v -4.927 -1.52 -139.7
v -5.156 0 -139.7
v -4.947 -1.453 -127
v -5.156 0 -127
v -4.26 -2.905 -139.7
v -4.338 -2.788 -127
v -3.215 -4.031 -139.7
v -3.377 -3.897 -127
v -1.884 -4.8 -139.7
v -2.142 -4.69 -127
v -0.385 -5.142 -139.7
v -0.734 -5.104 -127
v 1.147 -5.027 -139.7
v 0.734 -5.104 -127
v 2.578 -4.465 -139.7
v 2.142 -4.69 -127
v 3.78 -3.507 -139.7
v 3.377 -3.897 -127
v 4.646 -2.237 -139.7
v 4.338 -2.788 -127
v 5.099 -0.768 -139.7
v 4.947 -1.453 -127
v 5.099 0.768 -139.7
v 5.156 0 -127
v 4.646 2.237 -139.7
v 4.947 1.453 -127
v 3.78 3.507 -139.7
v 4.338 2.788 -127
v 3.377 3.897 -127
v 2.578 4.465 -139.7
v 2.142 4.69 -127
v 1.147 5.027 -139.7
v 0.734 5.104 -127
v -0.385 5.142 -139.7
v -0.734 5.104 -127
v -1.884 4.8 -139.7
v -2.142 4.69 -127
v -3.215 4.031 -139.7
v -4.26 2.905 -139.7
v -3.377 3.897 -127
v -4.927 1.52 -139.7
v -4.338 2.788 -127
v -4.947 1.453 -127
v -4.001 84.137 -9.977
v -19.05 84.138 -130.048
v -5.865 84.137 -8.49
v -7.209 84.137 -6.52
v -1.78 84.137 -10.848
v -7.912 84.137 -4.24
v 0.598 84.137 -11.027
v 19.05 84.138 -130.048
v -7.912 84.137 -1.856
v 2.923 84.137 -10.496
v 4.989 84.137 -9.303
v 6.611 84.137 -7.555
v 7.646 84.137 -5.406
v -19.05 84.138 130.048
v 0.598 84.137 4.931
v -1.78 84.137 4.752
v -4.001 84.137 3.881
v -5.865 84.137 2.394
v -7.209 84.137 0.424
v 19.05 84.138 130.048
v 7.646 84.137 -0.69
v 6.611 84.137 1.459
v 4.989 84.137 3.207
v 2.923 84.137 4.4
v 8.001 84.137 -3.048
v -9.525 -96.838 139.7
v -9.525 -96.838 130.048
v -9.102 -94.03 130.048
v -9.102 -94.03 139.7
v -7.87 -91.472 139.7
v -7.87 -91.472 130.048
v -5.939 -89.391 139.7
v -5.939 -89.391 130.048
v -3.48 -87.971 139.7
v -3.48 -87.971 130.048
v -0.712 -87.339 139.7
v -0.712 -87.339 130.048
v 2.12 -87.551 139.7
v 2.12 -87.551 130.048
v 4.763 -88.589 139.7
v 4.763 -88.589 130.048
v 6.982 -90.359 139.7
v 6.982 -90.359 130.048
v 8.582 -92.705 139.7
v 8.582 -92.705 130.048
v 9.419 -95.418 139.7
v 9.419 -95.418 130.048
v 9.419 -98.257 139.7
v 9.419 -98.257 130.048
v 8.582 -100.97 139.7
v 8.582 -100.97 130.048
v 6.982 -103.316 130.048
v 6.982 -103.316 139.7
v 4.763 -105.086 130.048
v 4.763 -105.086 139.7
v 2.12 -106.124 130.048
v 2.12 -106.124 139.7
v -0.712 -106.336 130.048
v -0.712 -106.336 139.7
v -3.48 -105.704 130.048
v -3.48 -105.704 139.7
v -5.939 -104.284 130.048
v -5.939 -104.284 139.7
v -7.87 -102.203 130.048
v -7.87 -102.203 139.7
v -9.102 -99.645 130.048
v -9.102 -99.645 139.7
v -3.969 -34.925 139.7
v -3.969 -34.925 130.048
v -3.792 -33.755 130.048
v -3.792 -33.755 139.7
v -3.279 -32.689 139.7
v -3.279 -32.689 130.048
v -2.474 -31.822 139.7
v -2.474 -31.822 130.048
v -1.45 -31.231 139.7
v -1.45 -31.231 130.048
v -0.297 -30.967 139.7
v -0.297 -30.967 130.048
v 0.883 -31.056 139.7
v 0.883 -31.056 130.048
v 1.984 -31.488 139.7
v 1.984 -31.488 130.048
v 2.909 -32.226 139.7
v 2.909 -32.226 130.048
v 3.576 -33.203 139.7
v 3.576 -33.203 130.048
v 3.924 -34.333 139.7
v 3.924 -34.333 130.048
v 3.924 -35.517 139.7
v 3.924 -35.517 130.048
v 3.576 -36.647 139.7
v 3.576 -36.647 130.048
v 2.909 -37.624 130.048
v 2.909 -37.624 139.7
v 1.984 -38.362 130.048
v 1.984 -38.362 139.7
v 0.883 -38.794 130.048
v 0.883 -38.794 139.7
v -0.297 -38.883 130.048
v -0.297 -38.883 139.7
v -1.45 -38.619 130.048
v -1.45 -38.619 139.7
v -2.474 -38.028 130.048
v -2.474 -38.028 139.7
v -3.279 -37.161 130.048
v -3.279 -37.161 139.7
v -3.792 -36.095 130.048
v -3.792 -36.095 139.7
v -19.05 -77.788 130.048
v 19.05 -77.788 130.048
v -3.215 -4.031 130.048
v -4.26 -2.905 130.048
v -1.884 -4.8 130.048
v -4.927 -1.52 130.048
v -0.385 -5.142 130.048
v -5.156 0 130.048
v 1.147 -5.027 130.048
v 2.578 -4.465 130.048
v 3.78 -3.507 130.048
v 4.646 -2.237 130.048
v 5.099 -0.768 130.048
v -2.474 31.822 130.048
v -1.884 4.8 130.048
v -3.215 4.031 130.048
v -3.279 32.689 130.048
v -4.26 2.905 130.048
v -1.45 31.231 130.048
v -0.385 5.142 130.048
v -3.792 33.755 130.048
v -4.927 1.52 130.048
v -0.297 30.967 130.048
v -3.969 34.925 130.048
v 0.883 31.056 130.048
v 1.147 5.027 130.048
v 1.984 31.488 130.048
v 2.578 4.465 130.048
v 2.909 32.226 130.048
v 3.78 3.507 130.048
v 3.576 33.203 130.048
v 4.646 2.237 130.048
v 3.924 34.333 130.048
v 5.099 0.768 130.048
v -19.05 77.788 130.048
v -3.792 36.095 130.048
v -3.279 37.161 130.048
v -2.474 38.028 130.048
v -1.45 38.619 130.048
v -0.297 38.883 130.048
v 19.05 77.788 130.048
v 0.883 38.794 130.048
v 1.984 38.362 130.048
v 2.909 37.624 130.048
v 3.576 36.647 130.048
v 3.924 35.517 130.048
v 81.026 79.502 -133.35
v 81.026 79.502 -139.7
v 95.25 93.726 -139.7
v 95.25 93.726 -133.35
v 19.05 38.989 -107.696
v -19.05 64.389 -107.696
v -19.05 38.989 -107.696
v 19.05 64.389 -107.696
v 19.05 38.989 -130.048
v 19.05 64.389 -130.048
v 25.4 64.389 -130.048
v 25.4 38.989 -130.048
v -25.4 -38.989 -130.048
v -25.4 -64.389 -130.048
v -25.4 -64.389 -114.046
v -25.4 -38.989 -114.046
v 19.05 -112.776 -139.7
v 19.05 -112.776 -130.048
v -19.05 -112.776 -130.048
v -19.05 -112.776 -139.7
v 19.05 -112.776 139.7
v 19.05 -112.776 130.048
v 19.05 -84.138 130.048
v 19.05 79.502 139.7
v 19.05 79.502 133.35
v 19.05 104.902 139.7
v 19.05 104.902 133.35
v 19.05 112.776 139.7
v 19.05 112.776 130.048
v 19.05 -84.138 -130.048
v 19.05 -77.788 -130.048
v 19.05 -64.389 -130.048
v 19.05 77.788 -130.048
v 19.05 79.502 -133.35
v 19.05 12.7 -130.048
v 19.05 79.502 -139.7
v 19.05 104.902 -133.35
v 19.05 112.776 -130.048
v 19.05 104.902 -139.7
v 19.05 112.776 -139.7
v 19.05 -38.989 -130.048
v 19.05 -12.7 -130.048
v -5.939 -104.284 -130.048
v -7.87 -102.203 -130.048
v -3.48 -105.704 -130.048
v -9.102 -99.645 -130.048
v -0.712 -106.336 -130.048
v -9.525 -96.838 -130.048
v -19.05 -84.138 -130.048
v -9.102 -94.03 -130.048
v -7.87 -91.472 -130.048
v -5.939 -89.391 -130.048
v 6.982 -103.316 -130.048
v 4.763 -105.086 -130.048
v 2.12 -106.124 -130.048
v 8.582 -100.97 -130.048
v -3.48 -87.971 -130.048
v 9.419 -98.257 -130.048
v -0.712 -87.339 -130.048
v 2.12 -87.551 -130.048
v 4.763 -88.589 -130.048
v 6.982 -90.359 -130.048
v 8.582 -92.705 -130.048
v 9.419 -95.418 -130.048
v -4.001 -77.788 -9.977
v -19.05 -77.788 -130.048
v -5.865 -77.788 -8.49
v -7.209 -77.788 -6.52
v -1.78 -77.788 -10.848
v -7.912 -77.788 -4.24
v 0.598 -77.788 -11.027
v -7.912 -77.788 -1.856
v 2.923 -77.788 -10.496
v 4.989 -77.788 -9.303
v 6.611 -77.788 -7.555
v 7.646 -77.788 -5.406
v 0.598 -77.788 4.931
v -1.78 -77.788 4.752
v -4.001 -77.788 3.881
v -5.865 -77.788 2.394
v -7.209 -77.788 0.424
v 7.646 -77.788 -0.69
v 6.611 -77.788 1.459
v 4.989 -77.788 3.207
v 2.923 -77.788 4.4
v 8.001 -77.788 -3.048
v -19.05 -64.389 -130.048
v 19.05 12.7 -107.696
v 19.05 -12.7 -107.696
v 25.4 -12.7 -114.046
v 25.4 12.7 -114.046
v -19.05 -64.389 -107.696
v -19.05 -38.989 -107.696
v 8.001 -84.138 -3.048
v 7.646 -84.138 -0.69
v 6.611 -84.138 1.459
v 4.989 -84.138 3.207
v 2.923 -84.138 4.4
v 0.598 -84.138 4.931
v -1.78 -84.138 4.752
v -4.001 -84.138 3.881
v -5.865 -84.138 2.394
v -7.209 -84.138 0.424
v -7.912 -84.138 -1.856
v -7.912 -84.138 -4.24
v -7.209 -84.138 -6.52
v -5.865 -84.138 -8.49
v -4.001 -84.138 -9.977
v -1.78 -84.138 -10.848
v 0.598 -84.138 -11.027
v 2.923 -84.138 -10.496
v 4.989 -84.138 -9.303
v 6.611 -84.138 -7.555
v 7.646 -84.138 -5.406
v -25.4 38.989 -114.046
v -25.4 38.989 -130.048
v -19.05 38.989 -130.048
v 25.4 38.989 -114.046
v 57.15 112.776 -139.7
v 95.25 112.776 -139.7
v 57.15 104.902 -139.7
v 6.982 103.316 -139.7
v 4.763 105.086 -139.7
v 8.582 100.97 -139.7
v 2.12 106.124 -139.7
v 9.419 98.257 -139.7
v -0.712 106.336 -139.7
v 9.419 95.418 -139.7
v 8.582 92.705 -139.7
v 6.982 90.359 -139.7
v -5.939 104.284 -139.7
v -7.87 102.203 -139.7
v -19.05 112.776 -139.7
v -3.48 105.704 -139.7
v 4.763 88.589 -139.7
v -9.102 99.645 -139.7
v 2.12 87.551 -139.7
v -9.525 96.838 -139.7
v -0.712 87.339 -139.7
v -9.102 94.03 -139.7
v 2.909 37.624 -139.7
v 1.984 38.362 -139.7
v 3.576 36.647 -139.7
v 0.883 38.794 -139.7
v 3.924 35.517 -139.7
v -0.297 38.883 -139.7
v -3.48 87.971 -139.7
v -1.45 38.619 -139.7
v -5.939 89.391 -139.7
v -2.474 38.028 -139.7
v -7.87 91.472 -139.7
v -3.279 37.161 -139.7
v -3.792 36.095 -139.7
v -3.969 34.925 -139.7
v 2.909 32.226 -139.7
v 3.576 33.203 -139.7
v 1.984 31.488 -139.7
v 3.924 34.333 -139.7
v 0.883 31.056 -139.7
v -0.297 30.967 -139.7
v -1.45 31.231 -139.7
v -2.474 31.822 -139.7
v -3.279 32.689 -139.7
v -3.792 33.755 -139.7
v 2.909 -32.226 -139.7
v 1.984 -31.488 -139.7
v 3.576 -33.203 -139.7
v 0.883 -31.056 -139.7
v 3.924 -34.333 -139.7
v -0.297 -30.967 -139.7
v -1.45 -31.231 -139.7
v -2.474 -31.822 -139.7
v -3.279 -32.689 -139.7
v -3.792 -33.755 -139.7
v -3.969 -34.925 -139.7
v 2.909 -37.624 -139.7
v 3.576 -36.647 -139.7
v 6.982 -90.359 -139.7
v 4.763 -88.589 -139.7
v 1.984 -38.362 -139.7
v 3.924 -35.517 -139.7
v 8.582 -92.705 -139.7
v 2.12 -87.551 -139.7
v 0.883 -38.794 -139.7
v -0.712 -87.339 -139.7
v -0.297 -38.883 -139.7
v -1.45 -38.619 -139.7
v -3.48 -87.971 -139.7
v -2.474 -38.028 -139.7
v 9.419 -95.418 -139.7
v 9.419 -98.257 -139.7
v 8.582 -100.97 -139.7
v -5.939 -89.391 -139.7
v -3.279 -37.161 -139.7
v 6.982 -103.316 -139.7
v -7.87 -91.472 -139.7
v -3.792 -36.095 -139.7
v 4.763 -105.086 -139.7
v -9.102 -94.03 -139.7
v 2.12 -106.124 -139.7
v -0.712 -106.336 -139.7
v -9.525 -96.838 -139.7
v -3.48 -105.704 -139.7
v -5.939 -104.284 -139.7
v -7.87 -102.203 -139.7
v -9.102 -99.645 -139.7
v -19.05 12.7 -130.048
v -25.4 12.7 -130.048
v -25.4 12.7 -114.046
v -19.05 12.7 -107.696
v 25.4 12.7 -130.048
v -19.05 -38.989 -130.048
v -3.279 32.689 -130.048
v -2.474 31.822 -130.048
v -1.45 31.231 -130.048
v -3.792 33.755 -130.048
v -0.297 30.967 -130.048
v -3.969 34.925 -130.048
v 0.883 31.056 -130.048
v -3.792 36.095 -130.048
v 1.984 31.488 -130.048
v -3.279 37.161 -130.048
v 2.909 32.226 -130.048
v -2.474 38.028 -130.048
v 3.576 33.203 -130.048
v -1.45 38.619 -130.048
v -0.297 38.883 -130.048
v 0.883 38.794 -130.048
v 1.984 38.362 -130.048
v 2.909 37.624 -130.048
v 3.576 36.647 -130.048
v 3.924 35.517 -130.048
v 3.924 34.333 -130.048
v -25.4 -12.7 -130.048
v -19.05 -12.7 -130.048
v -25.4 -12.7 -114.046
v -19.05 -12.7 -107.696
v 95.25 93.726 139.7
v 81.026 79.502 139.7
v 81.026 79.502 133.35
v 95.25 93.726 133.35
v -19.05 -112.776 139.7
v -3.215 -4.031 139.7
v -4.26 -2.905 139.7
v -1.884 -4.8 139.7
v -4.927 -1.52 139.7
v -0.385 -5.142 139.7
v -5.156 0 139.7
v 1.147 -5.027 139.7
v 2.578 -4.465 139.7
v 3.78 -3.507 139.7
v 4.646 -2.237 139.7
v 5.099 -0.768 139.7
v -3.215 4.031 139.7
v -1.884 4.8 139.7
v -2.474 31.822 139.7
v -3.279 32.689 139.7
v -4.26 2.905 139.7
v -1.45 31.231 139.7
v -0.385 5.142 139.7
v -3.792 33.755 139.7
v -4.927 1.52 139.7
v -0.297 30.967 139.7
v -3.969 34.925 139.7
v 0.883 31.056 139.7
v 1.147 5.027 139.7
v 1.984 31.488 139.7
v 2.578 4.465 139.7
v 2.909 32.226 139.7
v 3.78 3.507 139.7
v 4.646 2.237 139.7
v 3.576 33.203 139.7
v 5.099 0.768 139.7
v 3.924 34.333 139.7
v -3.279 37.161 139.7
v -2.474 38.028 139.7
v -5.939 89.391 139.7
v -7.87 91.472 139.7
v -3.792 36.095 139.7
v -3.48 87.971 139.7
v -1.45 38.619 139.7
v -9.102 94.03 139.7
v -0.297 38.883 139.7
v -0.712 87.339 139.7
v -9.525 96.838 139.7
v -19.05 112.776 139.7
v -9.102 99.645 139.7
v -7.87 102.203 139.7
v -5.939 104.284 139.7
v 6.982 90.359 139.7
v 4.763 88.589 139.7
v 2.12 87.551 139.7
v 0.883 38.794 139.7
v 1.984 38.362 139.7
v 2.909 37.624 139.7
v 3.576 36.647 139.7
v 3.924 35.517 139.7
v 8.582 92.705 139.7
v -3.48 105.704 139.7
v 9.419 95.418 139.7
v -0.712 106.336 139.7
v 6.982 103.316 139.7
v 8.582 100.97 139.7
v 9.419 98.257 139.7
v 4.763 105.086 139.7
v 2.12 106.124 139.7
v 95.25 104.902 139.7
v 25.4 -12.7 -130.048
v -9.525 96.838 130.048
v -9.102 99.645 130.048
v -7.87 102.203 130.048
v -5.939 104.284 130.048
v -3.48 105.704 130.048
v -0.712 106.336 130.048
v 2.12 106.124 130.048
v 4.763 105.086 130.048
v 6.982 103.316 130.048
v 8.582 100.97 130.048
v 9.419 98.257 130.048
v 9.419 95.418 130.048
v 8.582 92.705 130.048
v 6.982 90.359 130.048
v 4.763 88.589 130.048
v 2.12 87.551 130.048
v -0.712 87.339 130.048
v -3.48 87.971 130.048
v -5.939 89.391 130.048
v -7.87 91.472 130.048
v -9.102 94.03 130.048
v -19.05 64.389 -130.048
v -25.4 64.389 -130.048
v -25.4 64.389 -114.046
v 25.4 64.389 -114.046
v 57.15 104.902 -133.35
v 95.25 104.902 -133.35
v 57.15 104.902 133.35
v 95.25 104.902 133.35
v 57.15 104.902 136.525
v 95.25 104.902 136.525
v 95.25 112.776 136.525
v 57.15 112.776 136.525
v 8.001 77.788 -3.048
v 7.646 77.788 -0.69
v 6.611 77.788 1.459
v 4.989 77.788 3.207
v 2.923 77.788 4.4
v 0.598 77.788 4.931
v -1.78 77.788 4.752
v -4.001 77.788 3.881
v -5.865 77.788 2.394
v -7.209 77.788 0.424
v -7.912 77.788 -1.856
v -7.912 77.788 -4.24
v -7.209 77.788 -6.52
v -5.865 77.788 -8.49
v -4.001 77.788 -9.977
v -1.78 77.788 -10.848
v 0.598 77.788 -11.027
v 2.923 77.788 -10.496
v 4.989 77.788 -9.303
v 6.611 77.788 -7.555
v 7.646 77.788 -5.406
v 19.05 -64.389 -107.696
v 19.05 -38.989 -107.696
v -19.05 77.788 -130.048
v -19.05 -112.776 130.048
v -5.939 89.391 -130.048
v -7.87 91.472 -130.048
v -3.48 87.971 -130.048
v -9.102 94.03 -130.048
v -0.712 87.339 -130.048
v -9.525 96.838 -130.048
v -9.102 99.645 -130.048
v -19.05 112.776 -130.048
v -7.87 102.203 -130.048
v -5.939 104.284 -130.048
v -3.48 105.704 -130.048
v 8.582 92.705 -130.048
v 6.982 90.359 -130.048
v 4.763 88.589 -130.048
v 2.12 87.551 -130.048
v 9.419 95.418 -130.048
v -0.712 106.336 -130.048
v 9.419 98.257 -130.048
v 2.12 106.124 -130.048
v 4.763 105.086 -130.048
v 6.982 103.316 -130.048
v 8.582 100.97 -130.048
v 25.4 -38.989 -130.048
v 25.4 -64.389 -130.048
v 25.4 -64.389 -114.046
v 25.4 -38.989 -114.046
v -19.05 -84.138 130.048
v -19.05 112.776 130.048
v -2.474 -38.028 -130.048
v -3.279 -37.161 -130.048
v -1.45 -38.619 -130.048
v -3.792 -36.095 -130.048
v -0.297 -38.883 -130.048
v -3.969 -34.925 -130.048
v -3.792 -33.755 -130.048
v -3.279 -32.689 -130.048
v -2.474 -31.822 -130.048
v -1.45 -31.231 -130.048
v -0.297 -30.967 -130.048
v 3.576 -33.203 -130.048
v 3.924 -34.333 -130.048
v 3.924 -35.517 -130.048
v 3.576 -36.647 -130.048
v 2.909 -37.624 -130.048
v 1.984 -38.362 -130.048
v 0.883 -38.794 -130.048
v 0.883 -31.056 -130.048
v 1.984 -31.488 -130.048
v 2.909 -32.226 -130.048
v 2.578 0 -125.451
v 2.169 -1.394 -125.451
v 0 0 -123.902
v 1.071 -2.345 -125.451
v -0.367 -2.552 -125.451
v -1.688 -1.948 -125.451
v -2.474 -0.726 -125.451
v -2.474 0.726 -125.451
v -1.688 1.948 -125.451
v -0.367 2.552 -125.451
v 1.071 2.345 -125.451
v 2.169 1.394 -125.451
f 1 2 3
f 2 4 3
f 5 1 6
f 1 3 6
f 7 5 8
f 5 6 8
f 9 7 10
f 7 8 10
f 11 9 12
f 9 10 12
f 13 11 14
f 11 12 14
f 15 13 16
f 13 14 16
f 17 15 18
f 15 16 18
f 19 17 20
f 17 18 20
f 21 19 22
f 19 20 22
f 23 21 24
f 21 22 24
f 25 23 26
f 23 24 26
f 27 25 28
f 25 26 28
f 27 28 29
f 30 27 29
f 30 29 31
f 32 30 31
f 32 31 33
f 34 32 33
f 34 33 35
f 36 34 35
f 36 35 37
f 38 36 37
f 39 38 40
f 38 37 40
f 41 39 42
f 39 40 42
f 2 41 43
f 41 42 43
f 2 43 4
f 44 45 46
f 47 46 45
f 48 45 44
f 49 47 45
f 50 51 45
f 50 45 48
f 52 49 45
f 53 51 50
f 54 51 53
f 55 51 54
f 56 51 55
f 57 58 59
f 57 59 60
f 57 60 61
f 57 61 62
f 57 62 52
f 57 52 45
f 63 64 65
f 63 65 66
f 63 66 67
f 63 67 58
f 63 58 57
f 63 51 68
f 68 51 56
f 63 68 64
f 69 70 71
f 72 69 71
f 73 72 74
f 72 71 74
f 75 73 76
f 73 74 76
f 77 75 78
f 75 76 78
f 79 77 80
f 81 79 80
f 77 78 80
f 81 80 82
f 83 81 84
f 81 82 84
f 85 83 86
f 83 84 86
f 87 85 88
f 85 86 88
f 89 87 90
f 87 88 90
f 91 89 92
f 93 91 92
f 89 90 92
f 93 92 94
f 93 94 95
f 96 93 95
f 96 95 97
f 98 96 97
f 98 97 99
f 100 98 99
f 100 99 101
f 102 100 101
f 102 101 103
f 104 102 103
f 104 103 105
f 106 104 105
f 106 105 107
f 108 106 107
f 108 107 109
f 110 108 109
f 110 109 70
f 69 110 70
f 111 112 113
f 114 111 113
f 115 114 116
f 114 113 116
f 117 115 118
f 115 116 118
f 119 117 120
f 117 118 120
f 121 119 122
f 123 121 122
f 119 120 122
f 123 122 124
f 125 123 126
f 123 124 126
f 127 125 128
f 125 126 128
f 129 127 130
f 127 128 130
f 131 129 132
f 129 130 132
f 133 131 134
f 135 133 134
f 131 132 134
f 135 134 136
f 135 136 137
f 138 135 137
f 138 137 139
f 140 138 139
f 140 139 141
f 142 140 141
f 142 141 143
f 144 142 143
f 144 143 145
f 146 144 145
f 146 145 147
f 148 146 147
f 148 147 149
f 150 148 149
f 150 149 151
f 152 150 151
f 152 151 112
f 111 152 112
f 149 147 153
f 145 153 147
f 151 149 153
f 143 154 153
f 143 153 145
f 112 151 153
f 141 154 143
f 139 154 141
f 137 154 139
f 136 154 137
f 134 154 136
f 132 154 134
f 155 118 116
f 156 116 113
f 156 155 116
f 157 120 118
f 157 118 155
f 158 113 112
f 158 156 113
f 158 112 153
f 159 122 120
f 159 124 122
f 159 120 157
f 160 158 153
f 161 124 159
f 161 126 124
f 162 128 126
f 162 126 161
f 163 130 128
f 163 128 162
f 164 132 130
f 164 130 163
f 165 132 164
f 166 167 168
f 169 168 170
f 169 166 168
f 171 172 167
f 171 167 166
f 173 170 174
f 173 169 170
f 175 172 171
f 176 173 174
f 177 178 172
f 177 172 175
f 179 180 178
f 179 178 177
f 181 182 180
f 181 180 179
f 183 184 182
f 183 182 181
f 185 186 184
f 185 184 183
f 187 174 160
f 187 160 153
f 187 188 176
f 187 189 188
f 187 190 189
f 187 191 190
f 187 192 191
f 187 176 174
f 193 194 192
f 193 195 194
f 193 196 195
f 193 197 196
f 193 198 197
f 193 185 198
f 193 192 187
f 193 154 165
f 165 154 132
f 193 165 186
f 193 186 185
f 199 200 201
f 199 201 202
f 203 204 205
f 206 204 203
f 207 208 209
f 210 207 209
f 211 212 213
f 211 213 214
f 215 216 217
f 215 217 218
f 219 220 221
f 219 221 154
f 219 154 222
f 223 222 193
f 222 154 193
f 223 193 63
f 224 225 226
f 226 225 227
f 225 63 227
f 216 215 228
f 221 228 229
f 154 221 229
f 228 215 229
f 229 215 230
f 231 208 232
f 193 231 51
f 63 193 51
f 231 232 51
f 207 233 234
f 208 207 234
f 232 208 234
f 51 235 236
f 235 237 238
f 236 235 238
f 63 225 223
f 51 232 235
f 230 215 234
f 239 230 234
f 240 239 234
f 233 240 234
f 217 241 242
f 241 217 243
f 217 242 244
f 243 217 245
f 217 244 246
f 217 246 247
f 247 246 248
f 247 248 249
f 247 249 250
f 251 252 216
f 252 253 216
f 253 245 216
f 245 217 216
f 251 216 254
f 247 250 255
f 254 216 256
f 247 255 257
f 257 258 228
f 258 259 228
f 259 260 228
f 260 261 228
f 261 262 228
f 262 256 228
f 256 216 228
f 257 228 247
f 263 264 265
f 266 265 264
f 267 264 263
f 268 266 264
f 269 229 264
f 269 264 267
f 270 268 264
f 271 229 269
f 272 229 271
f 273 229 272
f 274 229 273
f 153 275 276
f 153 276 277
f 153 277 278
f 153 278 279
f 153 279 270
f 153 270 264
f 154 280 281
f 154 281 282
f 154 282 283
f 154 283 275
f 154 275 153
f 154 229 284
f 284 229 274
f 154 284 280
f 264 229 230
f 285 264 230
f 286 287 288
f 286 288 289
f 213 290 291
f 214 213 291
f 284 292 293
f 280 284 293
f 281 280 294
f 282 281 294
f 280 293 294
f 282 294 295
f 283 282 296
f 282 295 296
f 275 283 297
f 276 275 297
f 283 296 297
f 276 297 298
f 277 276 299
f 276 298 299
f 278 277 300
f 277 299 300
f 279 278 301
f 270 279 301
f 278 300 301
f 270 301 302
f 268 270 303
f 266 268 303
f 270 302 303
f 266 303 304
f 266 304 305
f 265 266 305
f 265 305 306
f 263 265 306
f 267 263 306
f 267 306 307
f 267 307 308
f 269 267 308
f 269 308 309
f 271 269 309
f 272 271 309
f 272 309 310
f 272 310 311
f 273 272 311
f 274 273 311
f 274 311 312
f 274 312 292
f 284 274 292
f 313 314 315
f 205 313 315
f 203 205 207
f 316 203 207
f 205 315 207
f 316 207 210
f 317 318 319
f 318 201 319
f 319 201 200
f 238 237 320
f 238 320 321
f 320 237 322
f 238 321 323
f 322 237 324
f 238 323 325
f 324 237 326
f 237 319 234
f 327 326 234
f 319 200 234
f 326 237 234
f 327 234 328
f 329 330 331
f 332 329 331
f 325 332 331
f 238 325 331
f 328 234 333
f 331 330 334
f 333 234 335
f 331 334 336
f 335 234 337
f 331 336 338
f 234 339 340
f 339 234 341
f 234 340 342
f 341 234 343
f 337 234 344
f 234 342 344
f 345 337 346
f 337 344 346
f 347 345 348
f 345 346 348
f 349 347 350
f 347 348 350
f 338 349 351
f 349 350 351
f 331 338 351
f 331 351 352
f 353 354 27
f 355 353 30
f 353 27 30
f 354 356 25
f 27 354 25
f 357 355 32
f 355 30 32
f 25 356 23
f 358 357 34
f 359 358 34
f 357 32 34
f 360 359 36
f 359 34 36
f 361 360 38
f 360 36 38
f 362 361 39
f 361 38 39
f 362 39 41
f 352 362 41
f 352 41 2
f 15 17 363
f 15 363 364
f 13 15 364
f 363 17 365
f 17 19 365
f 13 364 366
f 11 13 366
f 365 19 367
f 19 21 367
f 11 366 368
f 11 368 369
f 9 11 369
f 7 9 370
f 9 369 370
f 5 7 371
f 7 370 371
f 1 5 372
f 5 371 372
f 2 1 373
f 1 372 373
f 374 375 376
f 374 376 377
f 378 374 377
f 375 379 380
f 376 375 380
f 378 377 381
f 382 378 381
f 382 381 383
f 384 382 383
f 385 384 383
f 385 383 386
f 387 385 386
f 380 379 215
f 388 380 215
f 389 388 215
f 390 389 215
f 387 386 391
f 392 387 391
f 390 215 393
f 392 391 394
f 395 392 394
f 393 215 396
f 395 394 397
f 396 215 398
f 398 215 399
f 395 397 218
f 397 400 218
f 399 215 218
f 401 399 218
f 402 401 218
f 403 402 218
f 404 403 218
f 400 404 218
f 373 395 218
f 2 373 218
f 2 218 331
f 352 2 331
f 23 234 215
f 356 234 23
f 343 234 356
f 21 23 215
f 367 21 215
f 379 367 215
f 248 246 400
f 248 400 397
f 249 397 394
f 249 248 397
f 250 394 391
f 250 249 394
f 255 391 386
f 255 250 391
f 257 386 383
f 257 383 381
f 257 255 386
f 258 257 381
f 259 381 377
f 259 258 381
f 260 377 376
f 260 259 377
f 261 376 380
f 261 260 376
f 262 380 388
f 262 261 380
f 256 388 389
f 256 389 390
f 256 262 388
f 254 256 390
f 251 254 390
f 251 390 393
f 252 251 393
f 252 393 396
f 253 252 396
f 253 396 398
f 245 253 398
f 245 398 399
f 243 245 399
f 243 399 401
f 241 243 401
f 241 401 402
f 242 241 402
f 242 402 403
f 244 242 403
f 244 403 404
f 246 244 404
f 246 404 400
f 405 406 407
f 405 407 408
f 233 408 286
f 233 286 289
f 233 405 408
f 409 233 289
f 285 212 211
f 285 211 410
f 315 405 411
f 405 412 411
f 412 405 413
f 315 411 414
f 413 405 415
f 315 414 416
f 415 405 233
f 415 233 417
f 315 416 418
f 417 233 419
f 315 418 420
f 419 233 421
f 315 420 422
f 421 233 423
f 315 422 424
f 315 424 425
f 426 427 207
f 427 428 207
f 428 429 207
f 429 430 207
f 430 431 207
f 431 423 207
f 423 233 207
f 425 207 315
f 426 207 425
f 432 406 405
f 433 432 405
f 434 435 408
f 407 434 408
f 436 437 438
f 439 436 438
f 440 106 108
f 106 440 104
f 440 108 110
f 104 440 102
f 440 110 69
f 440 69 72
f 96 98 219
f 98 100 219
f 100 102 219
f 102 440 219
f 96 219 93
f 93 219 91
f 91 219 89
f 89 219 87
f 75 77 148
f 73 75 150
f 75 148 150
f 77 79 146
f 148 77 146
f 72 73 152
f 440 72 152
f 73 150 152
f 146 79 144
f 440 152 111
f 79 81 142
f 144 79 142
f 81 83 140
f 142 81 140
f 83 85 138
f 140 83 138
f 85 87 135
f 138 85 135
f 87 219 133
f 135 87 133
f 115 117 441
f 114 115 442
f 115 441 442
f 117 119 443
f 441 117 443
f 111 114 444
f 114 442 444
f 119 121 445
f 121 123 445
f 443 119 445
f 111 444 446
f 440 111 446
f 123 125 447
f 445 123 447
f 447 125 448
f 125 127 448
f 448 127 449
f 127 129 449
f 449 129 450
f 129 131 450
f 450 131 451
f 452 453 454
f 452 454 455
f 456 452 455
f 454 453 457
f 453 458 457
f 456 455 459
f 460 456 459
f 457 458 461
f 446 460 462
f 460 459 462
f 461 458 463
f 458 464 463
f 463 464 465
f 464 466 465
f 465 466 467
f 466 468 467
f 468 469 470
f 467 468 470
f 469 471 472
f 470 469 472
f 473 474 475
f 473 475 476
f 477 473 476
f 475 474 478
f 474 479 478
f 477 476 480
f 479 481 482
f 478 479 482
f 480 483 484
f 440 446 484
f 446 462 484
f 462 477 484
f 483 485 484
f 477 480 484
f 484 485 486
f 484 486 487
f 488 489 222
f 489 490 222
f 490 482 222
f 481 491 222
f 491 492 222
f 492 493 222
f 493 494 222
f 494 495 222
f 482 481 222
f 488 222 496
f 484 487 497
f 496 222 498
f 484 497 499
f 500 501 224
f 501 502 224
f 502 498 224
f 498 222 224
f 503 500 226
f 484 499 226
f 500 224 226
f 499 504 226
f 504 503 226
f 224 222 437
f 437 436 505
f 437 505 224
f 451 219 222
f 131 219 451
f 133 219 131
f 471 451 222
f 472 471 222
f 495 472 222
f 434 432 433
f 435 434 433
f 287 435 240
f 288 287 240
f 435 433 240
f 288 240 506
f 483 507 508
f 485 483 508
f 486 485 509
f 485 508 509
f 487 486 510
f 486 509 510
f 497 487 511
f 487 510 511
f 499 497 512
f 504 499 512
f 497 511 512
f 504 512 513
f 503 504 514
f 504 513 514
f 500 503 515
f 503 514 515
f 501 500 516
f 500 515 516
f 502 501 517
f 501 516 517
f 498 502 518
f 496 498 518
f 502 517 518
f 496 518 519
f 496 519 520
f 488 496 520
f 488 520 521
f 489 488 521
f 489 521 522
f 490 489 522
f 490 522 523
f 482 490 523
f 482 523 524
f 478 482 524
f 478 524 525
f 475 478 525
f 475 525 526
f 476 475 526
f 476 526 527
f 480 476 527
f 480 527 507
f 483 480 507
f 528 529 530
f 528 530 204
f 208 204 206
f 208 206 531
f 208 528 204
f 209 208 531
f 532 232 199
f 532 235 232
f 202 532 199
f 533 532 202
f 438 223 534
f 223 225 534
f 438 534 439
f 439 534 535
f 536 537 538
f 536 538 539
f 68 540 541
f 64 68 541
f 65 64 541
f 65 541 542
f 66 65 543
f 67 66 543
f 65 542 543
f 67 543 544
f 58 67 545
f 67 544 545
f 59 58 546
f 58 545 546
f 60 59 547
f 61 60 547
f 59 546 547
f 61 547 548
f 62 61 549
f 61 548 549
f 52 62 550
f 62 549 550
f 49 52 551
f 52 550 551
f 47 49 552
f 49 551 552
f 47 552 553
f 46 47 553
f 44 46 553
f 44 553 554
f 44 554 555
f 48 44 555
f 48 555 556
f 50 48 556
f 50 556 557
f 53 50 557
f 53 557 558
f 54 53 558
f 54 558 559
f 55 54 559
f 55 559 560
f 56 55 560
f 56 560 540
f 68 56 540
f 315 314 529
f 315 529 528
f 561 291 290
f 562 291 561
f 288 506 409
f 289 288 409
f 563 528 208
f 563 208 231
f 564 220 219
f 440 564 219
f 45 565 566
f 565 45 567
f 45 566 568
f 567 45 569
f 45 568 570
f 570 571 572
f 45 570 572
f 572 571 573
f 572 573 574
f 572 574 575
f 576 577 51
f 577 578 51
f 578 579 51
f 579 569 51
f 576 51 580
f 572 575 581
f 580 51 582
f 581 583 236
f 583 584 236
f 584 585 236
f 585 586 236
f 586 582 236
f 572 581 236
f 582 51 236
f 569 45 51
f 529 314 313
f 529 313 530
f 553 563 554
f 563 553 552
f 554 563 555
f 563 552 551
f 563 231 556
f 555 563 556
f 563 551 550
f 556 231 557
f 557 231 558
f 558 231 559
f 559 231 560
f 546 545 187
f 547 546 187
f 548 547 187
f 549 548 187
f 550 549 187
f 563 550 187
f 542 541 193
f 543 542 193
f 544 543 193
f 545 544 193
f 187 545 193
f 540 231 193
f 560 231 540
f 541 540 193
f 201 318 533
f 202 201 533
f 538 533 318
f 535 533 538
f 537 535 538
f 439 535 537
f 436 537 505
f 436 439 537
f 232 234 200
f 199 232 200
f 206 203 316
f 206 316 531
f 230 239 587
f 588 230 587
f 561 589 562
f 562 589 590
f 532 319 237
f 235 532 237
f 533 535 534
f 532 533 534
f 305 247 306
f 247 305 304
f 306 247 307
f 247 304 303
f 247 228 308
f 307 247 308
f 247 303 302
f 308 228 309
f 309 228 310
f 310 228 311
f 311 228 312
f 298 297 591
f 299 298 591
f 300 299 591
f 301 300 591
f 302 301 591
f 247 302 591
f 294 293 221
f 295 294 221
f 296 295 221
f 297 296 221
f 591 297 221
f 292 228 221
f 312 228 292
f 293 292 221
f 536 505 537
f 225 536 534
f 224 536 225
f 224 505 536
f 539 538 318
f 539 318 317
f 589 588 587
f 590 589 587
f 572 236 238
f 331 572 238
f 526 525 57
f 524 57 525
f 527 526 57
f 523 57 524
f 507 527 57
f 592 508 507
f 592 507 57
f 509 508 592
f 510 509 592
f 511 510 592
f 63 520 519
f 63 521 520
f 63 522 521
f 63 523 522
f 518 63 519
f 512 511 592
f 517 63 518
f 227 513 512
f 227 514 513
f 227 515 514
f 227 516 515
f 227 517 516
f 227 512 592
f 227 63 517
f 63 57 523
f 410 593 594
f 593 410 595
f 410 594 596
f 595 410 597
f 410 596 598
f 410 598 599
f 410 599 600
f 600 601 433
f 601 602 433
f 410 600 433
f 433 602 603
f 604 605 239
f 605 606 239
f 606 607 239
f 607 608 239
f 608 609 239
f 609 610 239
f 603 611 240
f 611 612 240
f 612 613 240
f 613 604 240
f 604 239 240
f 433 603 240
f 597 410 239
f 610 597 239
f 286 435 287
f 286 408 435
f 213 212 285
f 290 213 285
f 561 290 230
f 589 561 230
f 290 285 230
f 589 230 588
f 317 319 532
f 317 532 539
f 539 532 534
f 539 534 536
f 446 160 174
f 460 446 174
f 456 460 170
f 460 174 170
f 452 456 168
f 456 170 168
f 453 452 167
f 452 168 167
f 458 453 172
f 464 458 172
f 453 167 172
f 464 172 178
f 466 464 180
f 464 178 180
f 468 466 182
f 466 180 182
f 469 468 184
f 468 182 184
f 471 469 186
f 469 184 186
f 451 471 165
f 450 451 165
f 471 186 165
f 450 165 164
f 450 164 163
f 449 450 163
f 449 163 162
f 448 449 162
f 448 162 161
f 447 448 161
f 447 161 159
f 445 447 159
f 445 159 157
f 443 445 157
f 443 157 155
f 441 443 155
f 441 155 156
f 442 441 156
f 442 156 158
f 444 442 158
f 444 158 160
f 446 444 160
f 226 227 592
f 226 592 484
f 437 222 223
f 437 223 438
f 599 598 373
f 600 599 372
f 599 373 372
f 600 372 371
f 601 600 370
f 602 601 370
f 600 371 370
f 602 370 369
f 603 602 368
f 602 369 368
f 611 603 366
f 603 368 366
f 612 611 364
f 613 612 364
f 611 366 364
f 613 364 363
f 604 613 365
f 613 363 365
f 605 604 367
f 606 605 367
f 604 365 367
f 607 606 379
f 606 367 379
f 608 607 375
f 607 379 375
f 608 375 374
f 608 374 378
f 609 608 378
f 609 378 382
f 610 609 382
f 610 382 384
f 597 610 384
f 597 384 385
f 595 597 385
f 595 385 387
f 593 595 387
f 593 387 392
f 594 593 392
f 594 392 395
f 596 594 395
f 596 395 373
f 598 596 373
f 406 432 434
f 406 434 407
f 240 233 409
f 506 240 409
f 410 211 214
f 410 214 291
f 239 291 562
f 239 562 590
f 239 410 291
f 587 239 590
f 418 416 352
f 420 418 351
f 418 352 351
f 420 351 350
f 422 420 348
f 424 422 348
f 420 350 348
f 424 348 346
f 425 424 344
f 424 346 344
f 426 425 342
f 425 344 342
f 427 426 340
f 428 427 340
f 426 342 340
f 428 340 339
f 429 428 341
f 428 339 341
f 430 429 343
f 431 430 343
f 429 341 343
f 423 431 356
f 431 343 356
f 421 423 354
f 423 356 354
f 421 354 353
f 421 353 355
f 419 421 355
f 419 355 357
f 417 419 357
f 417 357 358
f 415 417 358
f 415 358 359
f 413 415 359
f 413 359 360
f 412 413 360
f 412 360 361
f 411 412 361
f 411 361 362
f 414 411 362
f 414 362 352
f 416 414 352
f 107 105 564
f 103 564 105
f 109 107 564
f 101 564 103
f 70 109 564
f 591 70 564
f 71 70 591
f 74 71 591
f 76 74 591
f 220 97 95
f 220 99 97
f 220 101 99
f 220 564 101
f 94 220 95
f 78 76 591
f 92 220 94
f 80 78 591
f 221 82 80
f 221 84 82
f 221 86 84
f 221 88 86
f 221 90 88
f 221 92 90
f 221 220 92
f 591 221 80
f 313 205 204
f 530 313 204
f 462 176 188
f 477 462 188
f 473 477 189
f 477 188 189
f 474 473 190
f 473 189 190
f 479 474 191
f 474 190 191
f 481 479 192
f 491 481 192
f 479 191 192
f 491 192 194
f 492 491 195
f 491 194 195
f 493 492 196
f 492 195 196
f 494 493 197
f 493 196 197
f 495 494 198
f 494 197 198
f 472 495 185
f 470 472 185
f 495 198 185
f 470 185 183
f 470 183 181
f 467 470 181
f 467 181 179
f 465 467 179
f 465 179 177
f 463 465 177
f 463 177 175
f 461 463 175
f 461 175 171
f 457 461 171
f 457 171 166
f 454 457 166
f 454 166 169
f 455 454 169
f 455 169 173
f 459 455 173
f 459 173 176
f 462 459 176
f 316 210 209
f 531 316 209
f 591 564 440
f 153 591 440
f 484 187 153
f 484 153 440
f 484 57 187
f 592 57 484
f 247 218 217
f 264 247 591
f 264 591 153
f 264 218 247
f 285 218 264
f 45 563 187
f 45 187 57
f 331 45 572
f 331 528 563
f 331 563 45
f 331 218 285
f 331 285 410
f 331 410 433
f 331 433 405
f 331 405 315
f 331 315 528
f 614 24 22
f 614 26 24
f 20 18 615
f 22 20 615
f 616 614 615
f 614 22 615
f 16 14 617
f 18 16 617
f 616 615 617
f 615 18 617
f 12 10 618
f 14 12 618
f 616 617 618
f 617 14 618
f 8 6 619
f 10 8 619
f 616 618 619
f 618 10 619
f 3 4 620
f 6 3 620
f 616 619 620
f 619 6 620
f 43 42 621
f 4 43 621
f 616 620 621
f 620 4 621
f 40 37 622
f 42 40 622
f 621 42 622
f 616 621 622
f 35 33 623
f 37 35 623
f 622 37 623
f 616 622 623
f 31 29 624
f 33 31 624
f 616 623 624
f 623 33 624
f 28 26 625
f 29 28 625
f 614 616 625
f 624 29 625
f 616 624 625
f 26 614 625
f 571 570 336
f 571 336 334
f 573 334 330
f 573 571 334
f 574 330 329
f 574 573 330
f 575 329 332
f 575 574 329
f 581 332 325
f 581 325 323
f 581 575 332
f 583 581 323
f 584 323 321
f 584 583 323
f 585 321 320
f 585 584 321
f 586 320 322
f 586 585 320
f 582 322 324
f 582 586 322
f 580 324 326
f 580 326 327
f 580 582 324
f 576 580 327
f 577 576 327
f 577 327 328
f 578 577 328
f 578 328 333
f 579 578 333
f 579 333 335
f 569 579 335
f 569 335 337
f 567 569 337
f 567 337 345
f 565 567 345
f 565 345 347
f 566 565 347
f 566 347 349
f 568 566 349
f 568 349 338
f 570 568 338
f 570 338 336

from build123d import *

# Parameters (mm, degrees)
F0_W       = 225.552
F0_H       = 9.652
F1_DEPTH   = 19.05
F3_D       = 19.05
F5_W       = 6.35
F5_H       = 260.096
F6_DEPTH   = 19.05
F9_D       = 16.002
F10_W      = 50.8
F10_H      = 25.4
F11_DEPTH  = 22.352
F12_SIZE   = 6.35
F14_D      = 7.9375
F16_D      = 10.3124
F16_DEPTH  = 28.8925
F16_TIP    = 3.0981575238
F18_D      = 10.3124
F18_DEPTH  = 12.7
F18_TIP    = 3.0981575238
F20_DEPTH  = 6.35
F22_SIZE   = 14.224
F22_2_SIZE = 14.224
F23_W      = 38.1
F23_H      = 276.225
F24_DEPTH  = 7.874


with BuildPart() as f1:
    # F0 (on Right) → F1 (new body, symmetric)
    with BuildSketch(Plane.YZ):
        with Locations((0, 134.874)):
            Rectangle(F0_W, F0_H)
    extrude(amount=F1_DEPTH, both=True)

    # F3 (through all)
    with Locations(Plane.XY.offset(139.7)):
        with Locations((0, -96.8375), (0, 96.8375)):
            Hole(F3_D / 2)


with BuildPart() as f4_1:
    # F4: instance of F1
    add(f1.part.mirror(Plane.XY))


with BuildPart() as f6:
    # F5 (on Right) → F6 (new body, symmetric)
    with BuildSketch(Plane.YZ):
        with Locations((-80.9625, 0)):
            Rectangle(F5_W, F5_H)
    extrude(amount=F6_DEPTH, both=True)


with BuildPart() as f6b:
    # F5 (on Right) → F6, piece 2 (new body, symmetric)
    with BuildSketch(Plane.YZ):
        with Locations((80.9625, 0)):
            Rectangle(F5_W, F5_H)
    extrude(amount=F6_DEPTH, both=True)


with BuildPart() as f1_1:
    add(f1.part)

    # F8: union F6, F6b, F4_1
    add(f6.part)
    add(f6b.part)
    add(f4_1.part)

    # F9 (through all)
    with Locations(Plane(origin=(0, 84.1375, 0), x_dir=(-1, 0, 0), z_dir=(0, 1, 0))):
        with Locations((0, -3.048)):
            Hole(F9_D / 2)

    # F10 (on face) → F11 (join)
    with BuildSketch(Plane.XY.offset(-130.048)):
        with Locations((0, -51.689)):
            Rectangle(F10_W, F10_H)
        Rectangle(F10_W, F10_H)
        with Locations((0, 51.689)):
            Rectangle(F10_W, F10_H)
    extrude(amount=F11_DEPTH)

    # F12
    f12_edges = [f1_1.edges().sort_by_distance(p)[0] for p in [
        (-25.4, -51.689, -107.696),
        (-25.4, 0, -107.696),
        (-25.4, 51.689, -107.696),
        (25.4, 51.689, -107.696),
        (25.4, 0, -107.696),
        (25.4, -51.689, -107.696),
    ]]
    chamfer(f12_edges, length=F12_SIZE)

    # F14 (through all)
    with Locations(Plane.XY.offset(139.7)):
        with Locations((0, -34.925), (0, 34.925)):
            Hole(F14_D / 2)

    # F16
    with Locations(Plane.XY.offset(139.7)):
        with Locations((0, 0)):
            Hole(F16_D / 2, depth=F16_DEPTH)
            with Locations((0, 0, -(F16_DEPTH + F16_TIP / 2))):  # 118° drill point
                Cone(0, F16_D / 2, F16_TIP, mode=Mode.SUBTRACT)

    # F18
    with Locations(Plane(origin=(0, 0, -139.7), x_dir=(1, 0, 0), z_dir=(0, 0, -1))):
        with Locations((0, 0)):
            Hole(F18_D / 2, depth=F18_DEPTH)
            with Locations((0, 0, -(F18_DEPTH + F18_TIP / 2))):  # 118° drill point
                Cone(0, F18_D / 2, F18_TIP, mode=Mode.SUBTRACT)

    # F21: F20 across plane


with BuildPart() as f20:
    # F19 (on face) → F20 (new body)
    with BuildSketch(Plane.XY.offset(139.7)):
        Polygon((19.05, 104.902), (19.05, 79.502), (73.2887461782, 79.502), (95.25, 79.502), (95.25, 104.902), align=None)
    extrude(amount=-F20_DEPTH)


with BuildPart() as f1_2:
    add(f1_1.part)
    add(f20.part.mirror(Plane.XY))

    # F22#2
    f22_2_edges = [f1_2.edges().sort_by_distance(p)[0] for p in [
        (95.25, 79.502, -136.525),
    ]]
    chamfer(f22_2_edges, length=F22_2_SIZE)



with BuildPart() as f20_1:
    add(f20.part)

    # F22
    f22_edges = [f20_1.edges().sort_by_distance(p)[0] for p in [
        (95.25, 79.502, 136.525),
    ]]
    chamfer(f22_edges, length=F22_SIZE)


with BuildPart() as f1_3:
    add(f1_2.part)

    add(f20_1.part)  # F24 merges F20
    # F23 (on face) → F24 (join)
    with BuildSketch(Plane(origin=(0, 104.902, 0), x_dir=(-1, 0, 0), z_dir=(0, 1, 0))):
        with Locations((-76.2, -1.5875)):
            Rectangle(F23_W, F23_H)
    extrude(amount=F24_DEPTH)


solid = f1_3.part
